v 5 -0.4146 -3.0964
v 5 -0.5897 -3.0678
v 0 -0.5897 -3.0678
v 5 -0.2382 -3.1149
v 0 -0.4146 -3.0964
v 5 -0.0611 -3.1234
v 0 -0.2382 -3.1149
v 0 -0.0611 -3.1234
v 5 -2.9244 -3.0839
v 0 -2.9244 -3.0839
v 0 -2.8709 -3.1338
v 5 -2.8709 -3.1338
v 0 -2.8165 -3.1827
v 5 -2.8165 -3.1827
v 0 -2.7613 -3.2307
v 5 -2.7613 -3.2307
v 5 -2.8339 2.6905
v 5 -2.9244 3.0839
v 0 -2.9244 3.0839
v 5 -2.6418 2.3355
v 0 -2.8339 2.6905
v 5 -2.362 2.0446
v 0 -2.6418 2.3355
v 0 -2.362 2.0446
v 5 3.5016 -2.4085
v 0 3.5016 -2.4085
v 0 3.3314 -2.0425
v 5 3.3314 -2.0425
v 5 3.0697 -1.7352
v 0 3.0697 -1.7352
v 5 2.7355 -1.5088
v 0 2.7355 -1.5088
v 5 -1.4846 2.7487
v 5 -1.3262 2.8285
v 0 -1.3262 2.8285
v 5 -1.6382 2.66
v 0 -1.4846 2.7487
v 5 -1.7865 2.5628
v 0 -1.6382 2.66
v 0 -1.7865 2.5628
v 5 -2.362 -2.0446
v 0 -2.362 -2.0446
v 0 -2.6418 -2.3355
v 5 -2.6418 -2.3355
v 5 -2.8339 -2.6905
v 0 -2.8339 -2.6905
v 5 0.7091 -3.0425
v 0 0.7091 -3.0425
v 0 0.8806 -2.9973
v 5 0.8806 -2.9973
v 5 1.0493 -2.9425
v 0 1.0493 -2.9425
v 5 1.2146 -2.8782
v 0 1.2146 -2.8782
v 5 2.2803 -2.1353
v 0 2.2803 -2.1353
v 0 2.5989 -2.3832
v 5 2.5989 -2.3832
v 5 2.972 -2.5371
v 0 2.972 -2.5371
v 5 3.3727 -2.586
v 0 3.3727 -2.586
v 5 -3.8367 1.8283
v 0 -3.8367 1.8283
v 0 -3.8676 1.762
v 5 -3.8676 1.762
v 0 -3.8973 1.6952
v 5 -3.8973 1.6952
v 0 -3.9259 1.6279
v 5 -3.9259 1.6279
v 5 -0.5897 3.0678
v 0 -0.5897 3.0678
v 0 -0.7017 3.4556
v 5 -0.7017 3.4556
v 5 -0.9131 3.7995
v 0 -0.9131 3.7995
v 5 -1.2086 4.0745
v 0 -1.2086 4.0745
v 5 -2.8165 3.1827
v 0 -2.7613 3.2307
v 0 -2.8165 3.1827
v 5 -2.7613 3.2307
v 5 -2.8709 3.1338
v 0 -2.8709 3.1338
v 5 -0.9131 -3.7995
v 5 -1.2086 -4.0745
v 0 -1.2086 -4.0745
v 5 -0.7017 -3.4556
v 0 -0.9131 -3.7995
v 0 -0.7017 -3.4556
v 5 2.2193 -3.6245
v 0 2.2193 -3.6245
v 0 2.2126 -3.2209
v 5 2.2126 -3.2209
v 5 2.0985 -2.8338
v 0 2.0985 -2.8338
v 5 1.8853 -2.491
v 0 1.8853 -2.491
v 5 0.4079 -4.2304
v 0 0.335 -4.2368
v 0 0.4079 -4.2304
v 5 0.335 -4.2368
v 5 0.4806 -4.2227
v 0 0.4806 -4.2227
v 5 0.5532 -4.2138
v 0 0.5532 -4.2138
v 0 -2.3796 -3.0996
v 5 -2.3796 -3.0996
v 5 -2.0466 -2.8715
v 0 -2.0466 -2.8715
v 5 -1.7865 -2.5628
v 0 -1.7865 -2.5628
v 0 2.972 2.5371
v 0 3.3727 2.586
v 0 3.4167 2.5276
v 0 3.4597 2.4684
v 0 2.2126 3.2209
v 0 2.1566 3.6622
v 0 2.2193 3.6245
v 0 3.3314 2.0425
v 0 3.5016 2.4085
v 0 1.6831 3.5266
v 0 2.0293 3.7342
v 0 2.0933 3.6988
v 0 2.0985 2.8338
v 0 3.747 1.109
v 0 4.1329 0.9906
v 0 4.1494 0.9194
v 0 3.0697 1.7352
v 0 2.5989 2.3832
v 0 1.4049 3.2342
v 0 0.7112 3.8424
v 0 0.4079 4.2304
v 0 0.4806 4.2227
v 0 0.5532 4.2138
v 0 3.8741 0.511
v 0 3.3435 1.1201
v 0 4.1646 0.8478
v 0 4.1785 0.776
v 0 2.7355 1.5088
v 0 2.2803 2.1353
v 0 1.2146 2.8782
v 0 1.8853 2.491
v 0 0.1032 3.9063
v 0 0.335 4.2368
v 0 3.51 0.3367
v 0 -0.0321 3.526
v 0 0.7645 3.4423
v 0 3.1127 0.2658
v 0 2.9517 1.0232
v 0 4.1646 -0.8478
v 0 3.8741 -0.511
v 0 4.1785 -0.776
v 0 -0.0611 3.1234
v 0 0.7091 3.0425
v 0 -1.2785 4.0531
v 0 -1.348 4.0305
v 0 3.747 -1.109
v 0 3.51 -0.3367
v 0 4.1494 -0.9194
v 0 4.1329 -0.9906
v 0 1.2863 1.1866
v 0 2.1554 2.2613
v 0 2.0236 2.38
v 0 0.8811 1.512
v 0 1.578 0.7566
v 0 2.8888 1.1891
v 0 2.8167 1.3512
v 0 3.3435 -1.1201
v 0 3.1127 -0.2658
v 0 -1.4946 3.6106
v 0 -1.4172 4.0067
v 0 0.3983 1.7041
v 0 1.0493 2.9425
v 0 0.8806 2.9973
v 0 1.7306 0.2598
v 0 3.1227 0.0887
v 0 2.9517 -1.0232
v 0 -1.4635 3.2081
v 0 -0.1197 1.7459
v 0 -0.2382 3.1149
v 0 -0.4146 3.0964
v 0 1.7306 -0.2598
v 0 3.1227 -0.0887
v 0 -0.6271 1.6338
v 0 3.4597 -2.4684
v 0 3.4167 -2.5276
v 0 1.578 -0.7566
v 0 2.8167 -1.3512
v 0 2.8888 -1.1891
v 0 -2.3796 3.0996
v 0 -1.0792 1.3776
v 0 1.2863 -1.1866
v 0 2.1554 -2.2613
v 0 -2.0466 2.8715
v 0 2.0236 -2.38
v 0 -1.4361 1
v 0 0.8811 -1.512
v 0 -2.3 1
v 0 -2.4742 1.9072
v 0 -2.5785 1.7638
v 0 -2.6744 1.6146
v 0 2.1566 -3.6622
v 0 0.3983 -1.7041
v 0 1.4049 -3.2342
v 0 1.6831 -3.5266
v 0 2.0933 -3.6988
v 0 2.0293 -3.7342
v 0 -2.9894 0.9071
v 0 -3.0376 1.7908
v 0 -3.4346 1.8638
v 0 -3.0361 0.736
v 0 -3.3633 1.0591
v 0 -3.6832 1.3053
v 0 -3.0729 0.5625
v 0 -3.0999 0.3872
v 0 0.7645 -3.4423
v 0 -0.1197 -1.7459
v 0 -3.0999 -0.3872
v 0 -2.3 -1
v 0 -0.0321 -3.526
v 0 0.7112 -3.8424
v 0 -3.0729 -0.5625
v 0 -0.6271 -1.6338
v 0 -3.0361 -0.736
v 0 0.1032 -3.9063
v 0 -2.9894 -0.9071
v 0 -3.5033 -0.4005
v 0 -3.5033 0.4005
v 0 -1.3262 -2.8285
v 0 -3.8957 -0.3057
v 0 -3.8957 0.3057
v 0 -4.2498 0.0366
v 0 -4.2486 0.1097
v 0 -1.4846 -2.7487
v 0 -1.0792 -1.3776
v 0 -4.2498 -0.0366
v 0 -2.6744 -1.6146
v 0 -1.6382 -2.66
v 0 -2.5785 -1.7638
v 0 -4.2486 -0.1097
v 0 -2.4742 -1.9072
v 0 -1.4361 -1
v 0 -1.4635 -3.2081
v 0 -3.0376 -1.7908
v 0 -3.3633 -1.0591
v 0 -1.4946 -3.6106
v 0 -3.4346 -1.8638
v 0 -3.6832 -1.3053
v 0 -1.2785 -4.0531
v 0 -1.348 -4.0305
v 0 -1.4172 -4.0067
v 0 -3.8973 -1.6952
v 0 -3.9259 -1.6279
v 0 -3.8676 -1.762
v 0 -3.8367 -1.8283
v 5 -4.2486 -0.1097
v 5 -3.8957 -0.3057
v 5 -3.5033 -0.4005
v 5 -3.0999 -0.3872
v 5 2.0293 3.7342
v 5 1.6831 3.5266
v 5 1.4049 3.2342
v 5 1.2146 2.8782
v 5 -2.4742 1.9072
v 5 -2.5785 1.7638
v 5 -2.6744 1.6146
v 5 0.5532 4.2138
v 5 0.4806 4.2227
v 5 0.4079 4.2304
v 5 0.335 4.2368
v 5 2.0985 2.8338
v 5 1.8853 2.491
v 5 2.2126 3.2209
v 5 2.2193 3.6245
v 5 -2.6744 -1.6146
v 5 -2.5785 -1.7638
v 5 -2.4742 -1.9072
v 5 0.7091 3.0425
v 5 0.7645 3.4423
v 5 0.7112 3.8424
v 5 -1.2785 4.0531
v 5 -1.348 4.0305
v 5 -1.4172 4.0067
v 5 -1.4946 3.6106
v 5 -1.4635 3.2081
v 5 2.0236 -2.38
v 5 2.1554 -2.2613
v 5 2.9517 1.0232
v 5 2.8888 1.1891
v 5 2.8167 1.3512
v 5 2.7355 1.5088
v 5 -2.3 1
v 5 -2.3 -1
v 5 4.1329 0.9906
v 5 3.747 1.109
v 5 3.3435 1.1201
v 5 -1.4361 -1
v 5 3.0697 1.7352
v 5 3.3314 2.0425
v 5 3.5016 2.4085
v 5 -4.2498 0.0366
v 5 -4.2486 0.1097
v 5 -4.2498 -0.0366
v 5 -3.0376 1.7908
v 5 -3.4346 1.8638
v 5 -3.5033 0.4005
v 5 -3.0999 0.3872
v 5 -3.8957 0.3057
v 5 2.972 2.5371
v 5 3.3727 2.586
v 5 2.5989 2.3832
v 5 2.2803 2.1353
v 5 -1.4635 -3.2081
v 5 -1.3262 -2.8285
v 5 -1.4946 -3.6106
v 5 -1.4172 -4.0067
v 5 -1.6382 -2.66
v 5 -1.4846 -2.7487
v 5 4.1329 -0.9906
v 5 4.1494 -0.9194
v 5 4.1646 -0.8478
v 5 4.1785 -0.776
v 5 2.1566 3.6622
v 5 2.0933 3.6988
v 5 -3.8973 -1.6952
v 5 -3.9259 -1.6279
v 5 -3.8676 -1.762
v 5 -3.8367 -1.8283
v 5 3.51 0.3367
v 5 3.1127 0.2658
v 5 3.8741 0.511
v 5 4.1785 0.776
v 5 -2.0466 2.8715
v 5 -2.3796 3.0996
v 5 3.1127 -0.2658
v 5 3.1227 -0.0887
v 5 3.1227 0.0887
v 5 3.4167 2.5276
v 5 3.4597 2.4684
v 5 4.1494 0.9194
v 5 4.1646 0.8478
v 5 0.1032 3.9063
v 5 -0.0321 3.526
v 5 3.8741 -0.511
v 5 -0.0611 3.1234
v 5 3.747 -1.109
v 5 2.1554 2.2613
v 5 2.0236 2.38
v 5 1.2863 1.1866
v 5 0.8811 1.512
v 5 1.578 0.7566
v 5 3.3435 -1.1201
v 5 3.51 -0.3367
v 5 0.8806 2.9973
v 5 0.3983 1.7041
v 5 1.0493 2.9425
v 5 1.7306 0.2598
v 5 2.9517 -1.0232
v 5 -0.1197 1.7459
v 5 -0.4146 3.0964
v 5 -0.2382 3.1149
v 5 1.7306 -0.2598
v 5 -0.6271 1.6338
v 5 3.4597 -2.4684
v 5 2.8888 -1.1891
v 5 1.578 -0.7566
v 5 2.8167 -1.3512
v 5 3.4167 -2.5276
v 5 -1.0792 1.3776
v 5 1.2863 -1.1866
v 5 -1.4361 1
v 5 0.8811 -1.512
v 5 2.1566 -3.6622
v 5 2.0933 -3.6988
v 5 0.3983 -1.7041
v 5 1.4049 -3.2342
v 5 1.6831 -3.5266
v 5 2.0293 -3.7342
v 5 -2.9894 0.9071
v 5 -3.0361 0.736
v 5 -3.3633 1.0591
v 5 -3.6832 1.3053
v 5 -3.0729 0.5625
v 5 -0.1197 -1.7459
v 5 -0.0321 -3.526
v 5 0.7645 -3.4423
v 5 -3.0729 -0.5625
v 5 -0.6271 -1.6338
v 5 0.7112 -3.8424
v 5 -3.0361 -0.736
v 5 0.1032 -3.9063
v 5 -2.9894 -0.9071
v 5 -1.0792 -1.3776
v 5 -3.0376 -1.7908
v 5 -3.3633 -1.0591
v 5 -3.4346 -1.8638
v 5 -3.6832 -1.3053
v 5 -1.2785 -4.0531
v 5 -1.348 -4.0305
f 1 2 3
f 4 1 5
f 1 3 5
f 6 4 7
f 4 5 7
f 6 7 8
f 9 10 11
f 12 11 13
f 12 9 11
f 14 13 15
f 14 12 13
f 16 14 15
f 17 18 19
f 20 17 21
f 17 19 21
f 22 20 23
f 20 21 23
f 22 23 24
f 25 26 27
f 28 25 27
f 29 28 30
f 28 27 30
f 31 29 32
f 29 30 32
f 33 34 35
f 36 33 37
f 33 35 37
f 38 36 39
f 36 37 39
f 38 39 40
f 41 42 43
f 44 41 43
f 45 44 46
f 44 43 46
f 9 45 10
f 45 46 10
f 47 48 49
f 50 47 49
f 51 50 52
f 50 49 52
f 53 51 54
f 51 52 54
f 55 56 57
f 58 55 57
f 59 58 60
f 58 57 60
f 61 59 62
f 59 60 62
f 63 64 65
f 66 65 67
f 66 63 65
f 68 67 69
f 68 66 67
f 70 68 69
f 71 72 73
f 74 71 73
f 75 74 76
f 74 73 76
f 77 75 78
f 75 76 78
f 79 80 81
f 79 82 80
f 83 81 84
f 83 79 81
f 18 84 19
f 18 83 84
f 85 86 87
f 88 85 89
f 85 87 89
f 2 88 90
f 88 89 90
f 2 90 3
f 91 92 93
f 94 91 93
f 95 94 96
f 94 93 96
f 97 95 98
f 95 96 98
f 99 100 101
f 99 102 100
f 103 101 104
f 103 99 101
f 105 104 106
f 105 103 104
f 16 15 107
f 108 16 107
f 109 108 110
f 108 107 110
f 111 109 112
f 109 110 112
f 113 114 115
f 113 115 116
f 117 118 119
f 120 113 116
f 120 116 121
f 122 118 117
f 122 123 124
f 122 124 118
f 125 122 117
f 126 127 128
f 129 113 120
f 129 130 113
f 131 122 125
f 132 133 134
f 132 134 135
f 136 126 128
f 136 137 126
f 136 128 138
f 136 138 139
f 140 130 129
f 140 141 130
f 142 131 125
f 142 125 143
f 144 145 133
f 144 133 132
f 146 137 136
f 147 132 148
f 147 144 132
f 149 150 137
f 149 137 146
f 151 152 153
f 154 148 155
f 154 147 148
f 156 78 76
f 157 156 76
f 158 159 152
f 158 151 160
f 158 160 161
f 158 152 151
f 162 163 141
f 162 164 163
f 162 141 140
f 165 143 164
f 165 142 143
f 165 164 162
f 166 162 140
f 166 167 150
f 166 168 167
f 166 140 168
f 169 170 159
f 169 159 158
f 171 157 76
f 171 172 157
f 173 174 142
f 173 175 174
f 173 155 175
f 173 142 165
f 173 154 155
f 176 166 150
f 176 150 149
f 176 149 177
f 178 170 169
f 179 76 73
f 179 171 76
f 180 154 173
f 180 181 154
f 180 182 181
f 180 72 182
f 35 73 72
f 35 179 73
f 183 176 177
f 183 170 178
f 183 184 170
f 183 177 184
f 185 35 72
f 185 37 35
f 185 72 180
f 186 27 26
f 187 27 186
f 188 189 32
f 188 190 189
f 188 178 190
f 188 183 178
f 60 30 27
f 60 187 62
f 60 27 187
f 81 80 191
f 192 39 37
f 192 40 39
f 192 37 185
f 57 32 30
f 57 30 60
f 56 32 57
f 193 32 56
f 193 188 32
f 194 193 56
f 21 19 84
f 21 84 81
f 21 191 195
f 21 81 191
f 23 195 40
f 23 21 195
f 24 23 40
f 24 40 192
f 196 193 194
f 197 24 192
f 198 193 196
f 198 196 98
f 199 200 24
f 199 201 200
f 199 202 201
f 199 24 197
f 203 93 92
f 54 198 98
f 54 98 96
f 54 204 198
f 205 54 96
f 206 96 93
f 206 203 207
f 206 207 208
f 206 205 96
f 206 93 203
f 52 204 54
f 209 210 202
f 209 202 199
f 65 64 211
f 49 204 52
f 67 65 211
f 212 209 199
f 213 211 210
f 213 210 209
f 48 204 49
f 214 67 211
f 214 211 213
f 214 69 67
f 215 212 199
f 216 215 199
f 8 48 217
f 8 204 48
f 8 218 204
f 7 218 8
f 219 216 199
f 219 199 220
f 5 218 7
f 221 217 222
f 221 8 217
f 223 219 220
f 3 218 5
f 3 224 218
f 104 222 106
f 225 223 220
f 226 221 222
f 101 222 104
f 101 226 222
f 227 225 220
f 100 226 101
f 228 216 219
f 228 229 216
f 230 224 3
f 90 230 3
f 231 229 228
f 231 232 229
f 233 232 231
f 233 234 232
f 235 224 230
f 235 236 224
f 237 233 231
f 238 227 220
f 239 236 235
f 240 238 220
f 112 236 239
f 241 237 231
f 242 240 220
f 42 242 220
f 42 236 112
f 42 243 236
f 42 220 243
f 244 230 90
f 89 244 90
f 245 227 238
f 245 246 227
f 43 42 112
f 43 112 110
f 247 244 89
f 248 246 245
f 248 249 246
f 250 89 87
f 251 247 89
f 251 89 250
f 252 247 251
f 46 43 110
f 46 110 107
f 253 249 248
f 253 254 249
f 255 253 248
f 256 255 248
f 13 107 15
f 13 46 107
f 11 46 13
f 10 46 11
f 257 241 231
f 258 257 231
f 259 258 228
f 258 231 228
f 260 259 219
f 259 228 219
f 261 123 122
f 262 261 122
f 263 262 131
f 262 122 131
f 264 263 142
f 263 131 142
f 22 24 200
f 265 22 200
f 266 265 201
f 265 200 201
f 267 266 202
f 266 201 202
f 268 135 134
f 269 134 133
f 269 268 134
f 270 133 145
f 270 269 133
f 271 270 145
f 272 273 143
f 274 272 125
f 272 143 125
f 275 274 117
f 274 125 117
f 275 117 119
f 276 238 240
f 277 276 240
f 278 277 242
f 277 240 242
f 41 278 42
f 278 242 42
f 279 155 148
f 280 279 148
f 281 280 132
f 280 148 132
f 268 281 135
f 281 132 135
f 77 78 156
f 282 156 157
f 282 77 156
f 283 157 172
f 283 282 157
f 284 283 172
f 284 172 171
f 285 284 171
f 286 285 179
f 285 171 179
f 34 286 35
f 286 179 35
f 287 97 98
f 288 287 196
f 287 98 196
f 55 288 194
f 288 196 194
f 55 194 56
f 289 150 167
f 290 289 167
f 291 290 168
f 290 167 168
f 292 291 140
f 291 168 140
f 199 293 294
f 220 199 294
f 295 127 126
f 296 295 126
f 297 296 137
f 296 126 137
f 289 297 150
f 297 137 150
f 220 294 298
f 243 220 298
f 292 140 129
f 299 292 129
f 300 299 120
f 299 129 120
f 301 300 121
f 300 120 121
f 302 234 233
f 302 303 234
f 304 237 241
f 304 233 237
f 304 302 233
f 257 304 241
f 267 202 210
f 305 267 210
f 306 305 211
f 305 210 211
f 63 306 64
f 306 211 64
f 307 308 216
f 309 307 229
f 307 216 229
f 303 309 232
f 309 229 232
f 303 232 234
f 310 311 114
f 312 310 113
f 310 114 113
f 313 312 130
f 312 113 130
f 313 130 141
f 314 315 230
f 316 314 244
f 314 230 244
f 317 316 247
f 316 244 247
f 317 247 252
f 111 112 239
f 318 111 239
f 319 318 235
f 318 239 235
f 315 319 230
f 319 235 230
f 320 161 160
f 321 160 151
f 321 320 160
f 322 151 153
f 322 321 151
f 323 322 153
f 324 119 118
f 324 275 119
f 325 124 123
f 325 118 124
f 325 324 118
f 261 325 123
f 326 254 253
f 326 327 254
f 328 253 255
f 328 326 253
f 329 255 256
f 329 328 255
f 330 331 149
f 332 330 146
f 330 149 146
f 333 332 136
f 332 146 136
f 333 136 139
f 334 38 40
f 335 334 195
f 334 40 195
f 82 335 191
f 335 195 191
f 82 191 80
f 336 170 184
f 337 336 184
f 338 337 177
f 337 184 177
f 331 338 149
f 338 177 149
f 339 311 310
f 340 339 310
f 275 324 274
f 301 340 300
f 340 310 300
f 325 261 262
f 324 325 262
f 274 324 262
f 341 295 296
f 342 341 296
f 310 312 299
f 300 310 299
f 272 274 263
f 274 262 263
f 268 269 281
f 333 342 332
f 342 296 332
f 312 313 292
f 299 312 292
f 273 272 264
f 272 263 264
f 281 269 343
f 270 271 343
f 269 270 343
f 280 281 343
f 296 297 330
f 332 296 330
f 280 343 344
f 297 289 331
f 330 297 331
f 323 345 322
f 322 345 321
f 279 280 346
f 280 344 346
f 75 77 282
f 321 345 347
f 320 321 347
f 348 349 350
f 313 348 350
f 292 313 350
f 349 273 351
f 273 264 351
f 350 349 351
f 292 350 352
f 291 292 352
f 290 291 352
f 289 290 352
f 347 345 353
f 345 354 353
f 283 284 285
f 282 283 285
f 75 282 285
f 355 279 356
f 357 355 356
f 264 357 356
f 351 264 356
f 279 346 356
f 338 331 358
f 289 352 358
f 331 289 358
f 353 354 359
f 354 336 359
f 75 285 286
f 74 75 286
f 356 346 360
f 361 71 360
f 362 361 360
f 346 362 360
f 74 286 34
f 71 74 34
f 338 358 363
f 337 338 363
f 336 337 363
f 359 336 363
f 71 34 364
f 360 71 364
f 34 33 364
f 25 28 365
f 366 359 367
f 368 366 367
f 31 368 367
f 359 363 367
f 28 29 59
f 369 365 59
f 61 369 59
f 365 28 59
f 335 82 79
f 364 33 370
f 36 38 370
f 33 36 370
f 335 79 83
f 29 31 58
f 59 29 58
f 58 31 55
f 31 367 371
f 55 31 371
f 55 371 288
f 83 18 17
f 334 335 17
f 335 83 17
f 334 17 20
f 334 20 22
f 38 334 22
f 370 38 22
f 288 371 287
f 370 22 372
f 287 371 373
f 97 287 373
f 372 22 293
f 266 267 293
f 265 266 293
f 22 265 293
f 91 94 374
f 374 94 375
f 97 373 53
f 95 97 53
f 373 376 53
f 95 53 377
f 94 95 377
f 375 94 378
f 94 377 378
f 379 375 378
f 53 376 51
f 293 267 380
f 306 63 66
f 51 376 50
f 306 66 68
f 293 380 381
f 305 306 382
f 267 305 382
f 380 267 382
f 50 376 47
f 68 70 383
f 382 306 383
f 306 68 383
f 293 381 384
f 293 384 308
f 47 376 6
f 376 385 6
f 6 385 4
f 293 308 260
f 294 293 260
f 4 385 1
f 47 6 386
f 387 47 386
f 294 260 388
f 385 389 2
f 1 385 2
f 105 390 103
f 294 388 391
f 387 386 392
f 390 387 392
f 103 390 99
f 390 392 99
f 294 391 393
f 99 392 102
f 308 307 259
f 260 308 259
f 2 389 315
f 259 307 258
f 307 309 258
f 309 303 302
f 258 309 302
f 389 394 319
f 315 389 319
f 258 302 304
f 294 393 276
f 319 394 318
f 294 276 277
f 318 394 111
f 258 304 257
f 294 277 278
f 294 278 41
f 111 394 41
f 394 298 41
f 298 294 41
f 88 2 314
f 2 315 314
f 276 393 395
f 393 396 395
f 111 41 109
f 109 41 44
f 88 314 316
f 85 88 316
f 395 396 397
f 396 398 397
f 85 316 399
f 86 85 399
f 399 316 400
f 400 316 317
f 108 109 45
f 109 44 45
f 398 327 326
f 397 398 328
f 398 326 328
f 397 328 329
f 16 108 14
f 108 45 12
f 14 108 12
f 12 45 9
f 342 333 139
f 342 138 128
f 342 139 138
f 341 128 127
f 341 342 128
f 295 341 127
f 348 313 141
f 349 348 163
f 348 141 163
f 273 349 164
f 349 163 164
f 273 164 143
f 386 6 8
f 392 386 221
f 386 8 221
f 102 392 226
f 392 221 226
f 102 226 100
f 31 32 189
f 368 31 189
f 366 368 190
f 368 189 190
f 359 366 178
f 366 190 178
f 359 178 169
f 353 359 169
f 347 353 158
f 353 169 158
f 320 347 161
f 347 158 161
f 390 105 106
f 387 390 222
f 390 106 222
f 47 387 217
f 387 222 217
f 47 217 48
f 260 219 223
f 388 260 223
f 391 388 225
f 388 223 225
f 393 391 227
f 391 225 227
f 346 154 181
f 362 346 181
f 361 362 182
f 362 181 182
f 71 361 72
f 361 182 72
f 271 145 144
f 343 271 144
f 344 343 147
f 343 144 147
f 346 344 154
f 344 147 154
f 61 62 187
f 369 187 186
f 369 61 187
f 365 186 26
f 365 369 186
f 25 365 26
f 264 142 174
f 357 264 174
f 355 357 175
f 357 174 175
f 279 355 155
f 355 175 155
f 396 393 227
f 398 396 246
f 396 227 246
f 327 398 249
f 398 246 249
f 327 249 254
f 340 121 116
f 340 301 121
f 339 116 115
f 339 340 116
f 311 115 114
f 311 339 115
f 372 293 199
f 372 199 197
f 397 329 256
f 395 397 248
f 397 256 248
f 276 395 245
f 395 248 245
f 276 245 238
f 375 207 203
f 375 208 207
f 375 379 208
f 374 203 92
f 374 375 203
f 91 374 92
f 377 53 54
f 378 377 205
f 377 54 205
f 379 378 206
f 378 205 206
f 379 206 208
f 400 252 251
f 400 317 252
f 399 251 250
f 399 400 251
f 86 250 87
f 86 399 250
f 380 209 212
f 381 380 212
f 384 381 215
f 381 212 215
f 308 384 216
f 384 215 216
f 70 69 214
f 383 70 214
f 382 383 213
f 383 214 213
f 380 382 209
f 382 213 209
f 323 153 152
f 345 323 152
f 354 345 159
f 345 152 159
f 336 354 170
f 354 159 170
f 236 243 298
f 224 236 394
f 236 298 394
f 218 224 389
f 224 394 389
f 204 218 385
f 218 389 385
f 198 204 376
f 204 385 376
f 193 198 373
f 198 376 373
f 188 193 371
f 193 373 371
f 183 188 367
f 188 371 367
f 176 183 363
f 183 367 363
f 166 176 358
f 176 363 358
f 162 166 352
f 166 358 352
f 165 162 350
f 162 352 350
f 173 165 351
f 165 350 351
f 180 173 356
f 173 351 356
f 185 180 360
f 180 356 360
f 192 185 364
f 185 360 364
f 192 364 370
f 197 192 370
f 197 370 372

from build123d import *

# Parameters (mm, degrees)
BASPROSKE_W             = 5
BASPROSKE_H             = 4.25
TOOTHCUT_DEPTH          = 8.818247886
TEETHCUTS_COUNT         = 15
TEETHCUTS_ANGLE         = 336
BORSKE_R                = 0.5
BORE_DEPTH              = 50.0000508
SKETCH1_R               = 1.75
CUT_EXTRUDE1_DEPTH      = 8.811066965
CUT_EXTRUDE1_DEPTH_BACK = 8.811066965
SKETCH2_W               = 2
SKETCH2_H               = 1.1
CUT_EXTRUDE2_DEPTH      = 8.811066965
CUT_EXTRUDE2_DEPTH_BACK = 8.811066965


with BuildPart() as part:
    # BasProSke → Base-Revolve (revolve)
    with BuildSketch(Plane(origin=(0, 0, 0), x_dir=(1, 0, 0), z_dir=(0, 1, 0)), mode=Mode.PRIVATE) as base_revolve_sk:
        with Locations((2.5, 2.125)):
            Rectangle(BASPROSKE_W, BASPROSKE_H)
    revolve(base_revolve_sk.sketch.rotate(Axis((-10, 0, 0), (1, 0, 0)), 180), axis=Axis((-10, 0, 0), (1, 0, 0)))

    # TooCutSke → ToothCut (cut, through all)
    with BuildSketch(Plane(origin=(0, 0, 0), x_dir=(0, 0, -1), z_dir=(1, 0, 0))):
        with BuildLine():
            ThreePointArc((0.265767165, 3.112674704), (0, 3.124), (-0.265767165, 3.112674704))
            ThreePointArc((-0.265767165, 3.112674704), (-0.418628877, 3.712626775), (-0.800767345, 4.19974009))
            ThreePointArc((-0.800767345, 4.19974009), (0, 4.2754), (0.800767345, 4.19974009))
            ThreePointArc((0.800767345, 4.19974009), (0.418628877, 3.712626775), (0.265767165, 3.112674704))
        make_face()
    toothcut = extrude(amount=TOOTHCUT_DEPTH, mode=Mode.SUBTRACT)

    # TeethCuts: ToothCut ×15 about axis
    teethcuts_axis = Axis((-10, 0, 0), (1, 0, 0))
    for i in range(1, TEETHCUTS_COUNT):
        add(toothcut.rotate(teethcuts_axis, i * TEETHCUTS_ANGLE / (TEETHCUTS_COUNT - 1)), mode=Mode.SUBTRACT)

    # BorSke → Bore (cut, symmetric)
    with BuildSketch(Plane(origin=(0, 0, 0), x_dir=(0, 0, -1), z_dir=(1, 0, 0))):
        with Locations(Location((0, 0, 0), (0, 0, 180))):
            Circle(BORSKE_R)
    extrude(amount=BORE_DEPTH, both=True, mode=Mode.SUBTRACT)

    # Sketch1 → Cut-Extrude1 (cut, two sides)
    with BuildSketch(Plane(origin=(5, 0, 0), x_dir=(0, 0, -1), z_dir=(1, 0, 0))) as cut_extrude1_sk:
        Circle(SKETCH1_R)
    extrude(amount=CUT_EXTRUDE1_DEPTH, mode=Mode.SUBTRACT)
    extrude(cut_extrude1_sk.sketch, amount=-CUT_EXTRUDE1_DEPTH_BACK, mode=Mode.SUBTRACT)

    # Sketch2 → Cut-Extrude2 (cut, two sides)
    with BuildSketch(Plane(origin=(5, 0, 0), x_dir=(0, 0, -1), z_dir=(1, 0, 0))) as cut_extrude2_sk:
        with Locations((0, -1.75)):
            Rectangle(SKETCH2_W, SKETCH2_H)
    extrude(amount=CUT_EXTRUDE2_DEPTH, mode=Mode.SUBTRACT)
    extrude(cut_extrude2_sk.sketch, amount=-CUT_EXTRUDE2_DEPTH_BACK, mode=Mode.SUBTRACT)


solid = part.part
